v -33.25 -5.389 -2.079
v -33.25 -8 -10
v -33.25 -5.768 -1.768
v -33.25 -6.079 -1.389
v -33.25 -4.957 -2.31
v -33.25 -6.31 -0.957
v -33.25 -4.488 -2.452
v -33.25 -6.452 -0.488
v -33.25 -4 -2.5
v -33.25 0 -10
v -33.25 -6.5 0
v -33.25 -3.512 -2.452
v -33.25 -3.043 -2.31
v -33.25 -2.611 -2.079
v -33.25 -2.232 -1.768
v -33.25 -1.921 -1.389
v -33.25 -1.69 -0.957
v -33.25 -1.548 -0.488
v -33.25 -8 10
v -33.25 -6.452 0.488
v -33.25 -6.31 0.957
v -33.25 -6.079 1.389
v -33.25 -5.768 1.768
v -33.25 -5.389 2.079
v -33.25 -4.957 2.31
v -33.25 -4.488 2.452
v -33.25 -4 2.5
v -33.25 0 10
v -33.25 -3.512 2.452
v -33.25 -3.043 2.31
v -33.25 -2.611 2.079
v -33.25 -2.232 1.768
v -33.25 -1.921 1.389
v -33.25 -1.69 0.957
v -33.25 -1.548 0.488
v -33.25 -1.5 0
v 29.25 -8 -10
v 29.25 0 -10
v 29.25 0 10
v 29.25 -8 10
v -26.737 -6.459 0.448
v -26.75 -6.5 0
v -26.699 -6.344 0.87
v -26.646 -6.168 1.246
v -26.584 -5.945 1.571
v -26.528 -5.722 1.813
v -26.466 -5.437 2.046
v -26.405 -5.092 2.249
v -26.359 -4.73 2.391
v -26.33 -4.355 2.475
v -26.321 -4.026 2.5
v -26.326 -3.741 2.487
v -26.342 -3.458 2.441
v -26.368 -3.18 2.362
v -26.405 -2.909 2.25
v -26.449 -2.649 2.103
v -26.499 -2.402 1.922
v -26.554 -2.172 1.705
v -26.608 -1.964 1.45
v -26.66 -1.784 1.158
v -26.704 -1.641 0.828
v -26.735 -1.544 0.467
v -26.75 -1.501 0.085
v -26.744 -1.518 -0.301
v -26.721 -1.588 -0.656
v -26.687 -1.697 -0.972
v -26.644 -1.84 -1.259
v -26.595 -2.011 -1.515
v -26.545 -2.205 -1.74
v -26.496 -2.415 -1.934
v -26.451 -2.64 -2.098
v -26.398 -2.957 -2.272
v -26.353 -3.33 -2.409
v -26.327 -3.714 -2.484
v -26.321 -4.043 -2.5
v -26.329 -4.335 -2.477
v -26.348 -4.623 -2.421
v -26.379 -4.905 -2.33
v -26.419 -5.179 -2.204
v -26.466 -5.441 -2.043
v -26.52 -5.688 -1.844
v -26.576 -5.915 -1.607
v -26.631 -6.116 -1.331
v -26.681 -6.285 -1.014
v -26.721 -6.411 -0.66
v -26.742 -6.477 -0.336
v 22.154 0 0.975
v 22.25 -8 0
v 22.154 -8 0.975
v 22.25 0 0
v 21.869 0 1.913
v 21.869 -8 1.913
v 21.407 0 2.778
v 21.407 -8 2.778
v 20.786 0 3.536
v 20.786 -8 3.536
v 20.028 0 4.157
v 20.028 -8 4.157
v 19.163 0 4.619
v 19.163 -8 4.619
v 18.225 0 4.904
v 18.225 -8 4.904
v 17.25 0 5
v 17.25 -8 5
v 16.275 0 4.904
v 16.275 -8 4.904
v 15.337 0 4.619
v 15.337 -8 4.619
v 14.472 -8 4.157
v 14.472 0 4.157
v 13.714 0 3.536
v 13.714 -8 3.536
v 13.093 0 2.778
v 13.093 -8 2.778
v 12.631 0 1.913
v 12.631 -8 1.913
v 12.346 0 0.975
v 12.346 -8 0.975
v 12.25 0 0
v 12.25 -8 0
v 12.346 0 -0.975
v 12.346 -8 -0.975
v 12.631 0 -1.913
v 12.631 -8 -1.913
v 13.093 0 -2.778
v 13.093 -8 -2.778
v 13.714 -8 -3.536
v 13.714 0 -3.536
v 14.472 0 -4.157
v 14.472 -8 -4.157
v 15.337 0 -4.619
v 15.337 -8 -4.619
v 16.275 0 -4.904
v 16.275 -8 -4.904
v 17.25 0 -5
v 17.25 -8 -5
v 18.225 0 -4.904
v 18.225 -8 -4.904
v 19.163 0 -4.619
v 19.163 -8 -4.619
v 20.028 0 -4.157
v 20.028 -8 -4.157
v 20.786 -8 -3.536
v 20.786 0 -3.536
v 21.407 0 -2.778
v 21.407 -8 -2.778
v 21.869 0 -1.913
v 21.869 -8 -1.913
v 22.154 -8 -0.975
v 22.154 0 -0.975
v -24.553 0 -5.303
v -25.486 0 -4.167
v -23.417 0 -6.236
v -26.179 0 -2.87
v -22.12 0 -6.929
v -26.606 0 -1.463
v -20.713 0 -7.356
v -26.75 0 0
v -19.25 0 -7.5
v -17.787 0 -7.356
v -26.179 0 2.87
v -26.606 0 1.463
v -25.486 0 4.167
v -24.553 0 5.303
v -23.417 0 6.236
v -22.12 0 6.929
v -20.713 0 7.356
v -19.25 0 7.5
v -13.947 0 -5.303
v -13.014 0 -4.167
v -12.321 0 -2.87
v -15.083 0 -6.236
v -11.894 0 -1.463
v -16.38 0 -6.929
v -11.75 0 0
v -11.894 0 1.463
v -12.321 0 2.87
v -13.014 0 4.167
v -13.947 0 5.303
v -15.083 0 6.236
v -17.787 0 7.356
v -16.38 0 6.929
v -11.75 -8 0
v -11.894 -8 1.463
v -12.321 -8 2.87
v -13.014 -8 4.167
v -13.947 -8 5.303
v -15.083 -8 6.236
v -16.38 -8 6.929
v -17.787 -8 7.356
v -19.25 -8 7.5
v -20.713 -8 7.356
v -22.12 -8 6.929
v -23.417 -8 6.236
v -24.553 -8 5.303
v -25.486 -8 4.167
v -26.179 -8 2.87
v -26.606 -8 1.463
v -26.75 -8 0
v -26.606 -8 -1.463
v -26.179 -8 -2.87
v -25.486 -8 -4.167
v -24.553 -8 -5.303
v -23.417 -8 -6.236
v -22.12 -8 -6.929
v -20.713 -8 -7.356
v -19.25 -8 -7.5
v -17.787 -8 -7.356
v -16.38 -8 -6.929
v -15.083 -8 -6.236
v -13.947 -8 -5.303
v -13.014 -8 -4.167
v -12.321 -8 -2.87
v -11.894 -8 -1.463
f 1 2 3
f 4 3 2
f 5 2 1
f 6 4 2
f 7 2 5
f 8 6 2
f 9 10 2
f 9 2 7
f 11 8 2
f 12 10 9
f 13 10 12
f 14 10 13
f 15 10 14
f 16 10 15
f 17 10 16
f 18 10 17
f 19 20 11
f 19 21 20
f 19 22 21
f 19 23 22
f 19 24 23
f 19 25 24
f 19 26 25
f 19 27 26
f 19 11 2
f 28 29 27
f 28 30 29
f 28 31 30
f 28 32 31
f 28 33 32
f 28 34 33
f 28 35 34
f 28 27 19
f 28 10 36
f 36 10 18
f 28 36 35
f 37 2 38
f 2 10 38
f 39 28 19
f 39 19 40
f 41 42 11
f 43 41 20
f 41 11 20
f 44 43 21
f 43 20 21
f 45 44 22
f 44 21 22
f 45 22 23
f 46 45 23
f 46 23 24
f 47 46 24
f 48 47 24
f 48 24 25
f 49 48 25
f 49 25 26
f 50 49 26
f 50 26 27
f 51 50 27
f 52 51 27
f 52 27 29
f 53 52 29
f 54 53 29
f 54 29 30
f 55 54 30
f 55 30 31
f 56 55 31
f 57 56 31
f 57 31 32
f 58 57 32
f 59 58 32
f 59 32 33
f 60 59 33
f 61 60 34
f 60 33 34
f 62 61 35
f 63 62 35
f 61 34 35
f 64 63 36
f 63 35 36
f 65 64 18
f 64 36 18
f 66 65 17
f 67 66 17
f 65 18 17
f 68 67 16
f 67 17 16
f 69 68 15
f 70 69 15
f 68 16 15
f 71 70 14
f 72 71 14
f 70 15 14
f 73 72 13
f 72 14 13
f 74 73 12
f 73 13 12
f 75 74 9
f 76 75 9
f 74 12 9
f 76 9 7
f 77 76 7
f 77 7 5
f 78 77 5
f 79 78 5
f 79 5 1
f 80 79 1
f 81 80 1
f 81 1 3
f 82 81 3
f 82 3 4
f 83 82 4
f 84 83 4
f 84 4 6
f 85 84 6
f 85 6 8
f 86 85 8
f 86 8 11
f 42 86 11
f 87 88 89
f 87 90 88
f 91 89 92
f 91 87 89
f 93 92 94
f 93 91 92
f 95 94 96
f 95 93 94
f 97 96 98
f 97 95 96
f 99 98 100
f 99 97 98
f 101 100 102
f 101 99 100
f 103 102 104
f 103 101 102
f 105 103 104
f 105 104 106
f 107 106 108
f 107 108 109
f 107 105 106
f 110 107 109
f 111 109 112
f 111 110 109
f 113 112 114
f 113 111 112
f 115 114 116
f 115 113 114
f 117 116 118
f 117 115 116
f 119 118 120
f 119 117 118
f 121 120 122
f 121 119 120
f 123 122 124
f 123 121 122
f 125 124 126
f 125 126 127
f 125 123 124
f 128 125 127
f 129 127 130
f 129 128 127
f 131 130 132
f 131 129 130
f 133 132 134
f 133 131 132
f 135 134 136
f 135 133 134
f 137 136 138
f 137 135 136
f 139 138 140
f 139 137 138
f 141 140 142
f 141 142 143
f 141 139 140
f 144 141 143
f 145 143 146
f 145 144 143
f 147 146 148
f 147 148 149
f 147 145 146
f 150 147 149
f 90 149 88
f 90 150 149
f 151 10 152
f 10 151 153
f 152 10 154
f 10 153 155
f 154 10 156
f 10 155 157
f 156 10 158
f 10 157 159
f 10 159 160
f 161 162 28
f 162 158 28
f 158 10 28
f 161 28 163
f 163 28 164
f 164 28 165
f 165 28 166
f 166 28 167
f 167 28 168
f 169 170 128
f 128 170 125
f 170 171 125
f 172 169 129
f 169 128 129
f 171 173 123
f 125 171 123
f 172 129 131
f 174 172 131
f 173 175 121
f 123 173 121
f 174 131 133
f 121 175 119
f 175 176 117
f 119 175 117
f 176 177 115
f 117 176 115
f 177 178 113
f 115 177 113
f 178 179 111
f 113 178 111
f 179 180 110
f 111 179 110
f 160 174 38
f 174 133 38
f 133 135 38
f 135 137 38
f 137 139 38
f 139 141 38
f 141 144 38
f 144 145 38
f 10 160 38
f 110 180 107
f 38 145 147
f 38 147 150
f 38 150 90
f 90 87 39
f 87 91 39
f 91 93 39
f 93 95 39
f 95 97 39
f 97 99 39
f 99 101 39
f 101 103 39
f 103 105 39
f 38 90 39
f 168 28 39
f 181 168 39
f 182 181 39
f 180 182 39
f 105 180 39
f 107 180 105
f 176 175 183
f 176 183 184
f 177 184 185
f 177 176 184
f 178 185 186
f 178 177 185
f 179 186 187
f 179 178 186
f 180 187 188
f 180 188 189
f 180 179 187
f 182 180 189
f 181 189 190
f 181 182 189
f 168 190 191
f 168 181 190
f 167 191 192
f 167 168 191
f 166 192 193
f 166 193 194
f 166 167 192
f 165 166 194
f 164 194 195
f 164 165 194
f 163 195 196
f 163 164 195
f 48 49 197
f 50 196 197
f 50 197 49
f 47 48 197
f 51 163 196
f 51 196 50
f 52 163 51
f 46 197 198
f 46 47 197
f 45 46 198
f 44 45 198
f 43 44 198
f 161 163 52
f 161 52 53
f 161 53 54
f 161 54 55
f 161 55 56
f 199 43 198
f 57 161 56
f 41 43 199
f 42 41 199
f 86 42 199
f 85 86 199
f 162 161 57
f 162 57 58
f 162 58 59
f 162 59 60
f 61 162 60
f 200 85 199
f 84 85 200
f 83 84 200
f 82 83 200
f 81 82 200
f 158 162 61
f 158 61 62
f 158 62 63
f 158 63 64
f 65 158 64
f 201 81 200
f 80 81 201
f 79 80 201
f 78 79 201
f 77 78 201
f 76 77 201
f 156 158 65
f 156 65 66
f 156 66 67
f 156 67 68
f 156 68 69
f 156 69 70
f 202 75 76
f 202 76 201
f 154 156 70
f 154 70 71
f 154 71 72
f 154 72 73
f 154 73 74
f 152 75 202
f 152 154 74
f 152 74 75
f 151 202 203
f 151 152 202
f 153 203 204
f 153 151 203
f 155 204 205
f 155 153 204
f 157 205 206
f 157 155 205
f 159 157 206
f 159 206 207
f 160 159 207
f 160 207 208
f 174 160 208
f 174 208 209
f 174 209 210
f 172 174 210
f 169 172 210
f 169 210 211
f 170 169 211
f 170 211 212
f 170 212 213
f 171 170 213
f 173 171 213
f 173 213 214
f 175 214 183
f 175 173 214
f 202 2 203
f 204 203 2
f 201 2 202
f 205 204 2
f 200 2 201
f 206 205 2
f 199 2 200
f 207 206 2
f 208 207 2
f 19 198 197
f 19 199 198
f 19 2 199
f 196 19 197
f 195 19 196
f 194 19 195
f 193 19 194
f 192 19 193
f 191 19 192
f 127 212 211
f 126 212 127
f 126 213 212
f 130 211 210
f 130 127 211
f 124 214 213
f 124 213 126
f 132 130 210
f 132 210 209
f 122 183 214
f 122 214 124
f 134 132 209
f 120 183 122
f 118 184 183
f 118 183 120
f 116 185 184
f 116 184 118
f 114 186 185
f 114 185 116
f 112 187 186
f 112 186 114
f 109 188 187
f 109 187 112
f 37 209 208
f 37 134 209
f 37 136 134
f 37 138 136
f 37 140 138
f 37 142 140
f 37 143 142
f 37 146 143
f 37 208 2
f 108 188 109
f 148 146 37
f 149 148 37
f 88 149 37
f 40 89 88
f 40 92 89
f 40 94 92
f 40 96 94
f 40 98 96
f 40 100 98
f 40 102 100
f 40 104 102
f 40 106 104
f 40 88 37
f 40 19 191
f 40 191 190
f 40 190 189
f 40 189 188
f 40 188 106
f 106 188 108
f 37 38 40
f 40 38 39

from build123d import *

# Parameters (mm, degrees)
F0_W     = 62.5
F0_H     = 20
F0_R     = 7.5
F0_R_2   = 5
F1_DEPTH = 5.5
F2_DEPTH = 2.5
F3_R     = 2.5
F4_DEPTH = 10


# Not quite as in the source:
# - a feature names something its author has since deleted; it is built from what else it names


with BuildPart() as f1:
    # F0 (on Front) → F1 (new body)
    with BuildSketch(Plane.XZ):
        with Locations((-2, 0)):
            Rectangle(F0_W, F0_H)
        with Locations((-19.25, 0)):
            Circle(F0_R, mode=Mode.SUBTRACT)
        with Locations((17.25, 0)):
            Circle(F0_R_2, mode=Mode.SUBTRACT)
    extrude(amount=F1_DEPTH)

    # F2 (add): a face of the model
    f2_faces = [f1.faces().sort_by_distance(p)[0] for p in [
        (-0.4554491501, -5.5, 0),
    ]]
    extrude(f2_faces, amount=F2_DEPTH)

    # F3 (on face) → F4 (cut)
    with BuildSketch(Plane(origin=(-33.25, 0, 0), x_dir=(0, -1, 0), z_dir=(-1, 0, 0))):
        with Locations((4, 0)):
            Circle(F3_R)
    extrude(amount=-F4_DEPTH, mode=Mode.SUBTRACT)


solid = f1.part
